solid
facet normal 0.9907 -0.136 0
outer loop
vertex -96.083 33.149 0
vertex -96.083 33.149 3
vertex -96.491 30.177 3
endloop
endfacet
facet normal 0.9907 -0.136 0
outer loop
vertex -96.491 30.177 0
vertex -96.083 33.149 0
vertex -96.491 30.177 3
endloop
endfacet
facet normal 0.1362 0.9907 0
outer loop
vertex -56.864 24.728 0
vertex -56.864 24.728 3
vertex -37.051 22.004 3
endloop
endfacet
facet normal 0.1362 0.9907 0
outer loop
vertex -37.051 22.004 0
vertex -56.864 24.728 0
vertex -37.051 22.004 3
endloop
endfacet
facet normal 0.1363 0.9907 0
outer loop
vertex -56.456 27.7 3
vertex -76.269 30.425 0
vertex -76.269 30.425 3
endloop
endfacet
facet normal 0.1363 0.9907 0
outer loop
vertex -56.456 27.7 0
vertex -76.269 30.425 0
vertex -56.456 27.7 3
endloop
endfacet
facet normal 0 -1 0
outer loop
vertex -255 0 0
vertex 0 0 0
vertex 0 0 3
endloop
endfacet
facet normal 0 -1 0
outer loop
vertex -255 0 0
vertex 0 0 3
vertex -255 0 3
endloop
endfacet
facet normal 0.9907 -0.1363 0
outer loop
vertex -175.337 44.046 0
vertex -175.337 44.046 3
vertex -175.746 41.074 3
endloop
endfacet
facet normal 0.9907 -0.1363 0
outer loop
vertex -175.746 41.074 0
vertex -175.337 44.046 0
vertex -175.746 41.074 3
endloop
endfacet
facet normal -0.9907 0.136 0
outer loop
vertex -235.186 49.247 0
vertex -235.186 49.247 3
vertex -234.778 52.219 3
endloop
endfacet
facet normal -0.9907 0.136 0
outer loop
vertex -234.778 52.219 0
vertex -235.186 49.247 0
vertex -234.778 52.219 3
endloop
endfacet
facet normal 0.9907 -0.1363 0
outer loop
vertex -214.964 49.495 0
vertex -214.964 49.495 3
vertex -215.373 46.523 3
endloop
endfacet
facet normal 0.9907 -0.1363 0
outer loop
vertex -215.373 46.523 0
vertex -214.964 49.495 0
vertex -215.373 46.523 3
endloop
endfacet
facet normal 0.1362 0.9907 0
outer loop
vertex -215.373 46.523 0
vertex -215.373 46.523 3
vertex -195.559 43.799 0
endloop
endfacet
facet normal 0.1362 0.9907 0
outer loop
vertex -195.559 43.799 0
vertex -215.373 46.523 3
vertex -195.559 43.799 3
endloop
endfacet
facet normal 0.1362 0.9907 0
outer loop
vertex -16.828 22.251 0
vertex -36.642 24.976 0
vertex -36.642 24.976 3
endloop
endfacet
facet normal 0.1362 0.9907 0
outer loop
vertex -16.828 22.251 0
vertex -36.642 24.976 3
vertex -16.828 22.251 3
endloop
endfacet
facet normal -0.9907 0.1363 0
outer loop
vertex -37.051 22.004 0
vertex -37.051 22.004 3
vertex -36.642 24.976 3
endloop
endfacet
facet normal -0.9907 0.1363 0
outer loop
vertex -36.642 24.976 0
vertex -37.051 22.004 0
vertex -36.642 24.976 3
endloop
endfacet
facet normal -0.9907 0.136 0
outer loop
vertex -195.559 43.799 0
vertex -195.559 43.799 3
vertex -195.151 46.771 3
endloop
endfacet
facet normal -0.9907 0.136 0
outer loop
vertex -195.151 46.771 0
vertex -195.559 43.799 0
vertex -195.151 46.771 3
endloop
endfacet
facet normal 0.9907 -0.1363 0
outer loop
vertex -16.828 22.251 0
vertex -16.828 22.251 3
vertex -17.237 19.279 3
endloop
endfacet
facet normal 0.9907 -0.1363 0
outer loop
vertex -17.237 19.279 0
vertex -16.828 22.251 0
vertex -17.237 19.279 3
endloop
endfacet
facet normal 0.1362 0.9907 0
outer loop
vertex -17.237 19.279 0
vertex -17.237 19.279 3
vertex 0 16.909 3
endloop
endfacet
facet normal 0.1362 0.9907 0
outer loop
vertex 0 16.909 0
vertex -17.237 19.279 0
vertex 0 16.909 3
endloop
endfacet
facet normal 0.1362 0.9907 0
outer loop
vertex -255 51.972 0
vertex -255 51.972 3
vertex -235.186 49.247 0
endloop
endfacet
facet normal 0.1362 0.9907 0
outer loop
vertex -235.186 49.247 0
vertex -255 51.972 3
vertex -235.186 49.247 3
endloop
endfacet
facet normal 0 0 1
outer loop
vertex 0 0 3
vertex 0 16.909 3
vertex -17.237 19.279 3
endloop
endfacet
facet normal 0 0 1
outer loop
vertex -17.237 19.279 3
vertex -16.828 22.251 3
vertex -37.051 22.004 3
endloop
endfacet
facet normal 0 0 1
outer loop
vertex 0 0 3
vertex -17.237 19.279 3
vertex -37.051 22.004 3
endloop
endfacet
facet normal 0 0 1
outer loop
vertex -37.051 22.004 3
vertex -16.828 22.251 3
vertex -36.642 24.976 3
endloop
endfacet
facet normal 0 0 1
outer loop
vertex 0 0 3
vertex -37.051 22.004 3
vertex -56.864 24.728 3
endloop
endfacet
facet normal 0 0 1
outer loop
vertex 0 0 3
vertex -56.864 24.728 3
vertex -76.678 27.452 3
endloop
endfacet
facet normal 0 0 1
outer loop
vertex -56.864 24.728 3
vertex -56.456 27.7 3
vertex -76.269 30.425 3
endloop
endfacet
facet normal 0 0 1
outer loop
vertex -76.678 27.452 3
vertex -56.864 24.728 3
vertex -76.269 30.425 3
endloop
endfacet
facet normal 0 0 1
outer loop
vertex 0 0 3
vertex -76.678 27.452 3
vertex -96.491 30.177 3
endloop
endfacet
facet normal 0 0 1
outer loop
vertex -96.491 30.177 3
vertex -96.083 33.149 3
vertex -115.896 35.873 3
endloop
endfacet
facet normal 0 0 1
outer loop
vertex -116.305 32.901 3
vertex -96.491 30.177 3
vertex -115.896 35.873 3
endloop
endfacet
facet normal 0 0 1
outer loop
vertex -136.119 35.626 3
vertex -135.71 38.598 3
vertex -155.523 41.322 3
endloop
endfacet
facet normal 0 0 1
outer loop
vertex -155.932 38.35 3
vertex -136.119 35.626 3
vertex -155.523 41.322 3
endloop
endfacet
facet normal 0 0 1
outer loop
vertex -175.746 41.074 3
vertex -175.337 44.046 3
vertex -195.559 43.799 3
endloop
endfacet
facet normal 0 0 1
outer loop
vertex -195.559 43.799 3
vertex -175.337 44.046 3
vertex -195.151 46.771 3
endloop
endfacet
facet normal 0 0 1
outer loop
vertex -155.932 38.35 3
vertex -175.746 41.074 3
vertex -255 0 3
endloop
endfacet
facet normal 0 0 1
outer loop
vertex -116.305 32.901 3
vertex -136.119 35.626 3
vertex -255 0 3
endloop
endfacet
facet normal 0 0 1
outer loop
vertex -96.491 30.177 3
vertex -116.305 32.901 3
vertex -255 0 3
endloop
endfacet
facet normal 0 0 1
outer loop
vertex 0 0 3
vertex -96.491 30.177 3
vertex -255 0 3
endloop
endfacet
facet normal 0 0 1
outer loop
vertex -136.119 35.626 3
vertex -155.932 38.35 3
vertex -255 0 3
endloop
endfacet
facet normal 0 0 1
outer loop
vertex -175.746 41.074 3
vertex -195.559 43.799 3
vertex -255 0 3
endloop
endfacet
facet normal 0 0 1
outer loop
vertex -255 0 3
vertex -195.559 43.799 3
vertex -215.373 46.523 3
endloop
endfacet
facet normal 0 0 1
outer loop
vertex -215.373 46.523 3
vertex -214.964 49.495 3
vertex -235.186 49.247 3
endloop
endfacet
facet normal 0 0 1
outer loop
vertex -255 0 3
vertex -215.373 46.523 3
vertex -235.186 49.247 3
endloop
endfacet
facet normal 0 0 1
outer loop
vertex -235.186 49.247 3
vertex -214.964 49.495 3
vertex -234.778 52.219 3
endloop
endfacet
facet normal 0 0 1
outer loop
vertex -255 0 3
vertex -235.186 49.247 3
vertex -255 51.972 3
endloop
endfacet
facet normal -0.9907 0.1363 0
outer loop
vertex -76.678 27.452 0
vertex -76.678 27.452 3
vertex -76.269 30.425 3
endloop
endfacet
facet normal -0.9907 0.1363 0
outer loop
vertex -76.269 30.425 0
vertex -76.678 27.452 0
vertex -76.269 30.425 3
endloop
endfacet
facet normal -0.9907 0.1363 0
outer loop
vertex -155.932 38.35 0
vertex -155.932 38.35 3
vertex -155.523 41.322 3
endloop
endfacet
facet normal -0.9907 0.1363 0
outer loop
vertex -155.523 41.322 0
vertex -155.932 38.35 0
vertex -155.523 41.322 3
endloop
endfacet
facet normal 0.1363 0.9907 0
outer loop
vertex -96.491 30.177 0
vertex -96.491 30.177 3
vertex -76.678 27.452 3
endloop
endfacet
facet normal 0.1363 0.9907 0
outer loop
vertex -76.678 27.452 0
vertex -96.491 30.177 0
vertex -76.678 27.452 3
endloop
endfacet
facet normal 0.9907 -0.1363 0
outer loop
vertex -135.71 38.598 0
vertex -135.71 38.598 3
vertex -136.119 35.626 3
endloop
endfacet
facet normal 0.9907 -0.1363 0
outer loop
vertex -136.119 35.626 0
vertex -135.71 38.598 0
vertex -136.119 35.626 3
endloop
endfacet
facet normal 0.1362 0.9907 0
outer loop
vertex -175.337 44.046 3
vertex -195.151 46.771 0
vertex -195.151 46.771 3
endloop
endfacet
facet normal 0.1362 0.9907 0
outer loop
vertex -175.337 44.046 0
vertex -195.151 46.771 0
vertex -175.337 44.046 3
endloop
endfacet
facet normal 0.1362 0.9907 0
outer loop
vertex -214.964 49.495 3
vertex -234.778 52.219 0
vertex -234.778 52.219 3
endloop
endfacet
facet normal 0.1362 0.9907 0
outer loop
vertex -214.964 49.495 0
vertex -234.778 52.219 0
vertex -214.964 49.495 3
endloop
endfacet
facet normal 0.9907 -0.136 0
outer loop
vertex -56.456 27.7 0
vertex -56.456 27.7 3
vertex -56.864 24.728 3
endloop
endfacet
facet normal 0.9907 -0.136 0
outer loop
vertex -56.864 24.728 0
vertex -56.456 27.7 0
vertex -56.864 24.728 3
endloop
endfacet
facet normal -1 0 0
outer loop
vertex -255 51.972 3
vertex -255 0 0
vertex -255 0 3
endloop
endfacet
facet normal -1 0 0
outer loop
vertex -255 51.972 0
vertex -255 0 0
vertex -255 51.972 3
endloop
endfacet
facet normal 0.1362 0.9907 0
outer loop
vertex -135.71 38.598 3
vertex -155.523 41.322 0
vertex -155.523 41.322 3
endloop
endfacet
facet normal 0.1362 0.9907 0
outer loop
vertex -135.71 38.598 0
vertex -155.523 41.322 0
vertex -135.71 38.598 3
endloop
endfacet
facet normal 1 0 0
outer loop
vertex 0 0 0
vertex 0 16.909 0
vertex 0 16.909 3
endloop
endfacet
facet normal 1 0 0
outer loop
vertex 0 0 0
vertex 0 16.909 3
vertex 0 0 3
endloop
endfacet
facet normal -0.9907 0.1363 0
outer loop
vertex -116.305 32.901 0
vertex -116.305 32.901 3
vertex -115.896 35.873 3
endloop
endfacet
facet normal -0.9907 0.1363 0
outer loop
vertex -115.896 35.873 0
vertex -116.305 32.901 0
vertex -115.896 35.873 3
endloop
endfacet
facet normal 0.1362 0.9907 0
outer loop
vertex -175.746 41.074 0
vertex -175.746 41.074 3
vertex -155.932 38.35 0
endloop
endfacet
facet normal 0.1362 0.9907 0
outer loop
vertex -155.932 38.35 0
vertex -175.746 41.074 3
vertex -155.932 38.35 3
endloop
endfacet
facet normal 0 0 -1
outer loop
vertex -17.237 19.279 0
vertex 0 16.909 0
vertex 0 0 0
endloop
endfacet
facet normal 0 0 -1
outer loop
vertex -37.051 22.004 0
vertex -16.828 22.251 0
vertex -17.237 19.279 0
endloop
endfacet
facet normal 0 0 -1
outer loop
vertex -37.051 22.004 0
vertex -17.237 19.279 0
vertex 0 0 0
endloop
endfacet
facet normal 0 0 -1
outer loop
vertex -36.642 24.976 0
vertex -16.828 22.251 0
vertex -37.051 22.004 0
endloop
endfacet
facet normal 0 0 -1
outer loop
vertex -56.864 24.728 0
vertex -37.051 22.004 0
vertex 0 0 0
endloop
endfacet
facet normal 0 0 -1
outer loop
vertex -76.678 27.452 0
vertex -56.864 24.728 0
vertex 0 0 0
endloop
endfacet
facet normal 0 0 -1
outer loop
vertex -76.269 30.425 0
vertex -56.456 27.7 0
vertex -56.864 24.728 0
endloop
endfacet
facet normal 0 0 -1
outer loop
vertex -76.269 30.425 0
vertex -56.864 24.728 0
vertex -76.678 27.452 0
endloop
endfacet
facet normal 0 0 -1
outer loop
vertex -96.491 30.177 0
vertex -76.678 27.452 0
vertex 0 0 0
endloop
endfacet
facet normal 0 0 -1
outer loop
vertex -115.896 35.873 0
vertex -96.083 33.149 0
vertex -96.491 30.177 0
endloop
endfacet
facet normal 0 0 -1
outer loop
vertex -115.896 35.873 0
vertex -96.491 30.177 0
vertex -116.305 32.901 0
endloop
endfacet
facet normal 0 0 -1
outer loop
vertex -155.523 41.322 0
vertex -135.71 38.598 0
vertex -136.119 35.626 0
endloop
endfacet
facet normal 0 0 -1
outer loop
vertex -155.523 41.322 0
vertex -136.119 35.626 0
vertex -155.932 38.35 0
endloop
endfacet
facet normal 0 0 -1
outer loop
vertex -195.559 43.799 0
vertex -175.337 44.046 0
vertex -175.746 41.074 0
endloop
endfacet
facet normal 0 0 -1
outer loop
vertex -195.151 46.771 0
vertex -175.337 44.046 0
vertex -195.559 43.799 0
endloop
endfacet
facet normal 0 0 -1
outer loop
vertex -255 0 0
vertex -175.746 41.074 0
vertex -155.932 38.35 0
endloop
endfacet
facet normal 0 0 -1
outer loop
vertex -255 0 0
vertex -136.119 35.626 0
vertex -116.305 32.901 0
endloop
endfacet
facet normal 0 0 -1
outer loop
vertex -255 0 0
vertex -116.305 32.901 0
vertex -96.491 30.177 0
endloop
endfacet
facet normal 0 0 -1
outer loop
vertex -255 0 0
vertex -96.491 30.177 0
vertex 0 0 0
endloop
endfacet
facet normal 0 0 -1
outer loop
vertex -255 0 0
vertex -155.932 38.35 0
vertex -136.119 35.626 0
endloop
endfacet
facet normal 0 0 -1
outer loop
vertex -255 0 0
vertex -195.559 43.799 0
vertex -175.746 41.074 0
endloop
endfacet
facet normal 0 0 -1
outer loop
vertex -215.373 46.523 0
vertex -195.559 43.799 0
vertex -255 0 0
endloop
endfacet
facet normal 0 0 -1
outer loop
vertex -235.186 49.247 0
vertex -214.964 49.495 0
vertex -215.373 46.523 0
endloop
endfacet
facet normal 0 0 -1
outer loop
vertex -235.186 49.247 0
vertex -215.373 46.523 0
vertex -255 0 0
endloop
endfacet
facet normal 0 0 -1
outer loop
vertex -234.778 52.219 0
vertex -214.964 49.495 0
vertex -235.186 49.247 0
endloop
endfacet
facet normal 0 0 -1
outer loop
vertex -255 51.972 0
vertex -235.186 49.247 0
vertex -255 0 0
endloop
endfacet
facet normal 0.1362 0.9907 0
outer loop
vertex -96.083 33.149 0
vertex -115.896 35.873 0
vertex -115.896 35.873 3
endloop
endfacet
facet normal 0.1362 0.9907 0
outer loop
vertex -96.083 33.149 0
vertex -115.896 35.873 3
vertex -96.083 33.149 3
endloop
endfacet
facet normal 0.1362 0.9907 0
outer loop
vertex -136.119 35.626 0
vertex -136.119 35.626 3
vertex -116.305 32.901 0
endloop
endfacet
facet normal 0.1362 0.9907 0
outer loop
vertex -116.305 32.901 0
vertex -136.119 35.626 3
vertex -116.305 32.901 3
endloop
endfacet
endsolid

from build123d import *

# Parameters (mm, degrees)
BOSS_EXTRU_1_DEPTH      = 3
ENL_V_MAT_EXTRU_1_DEPTH = 4


with BuildPart() as part:
    # Esquisse1 → Boss.-Extru.1 (new body)
    with BuildSketch(Plane.XY):
        Polygon((0, 0), (-255, 0), (-255, 55), (0, 19.9375), align=None)
    extrude(amount=BOSS_EXTRU_1_DEPTH)

    # Esquisse2 → Enlèv. mat.-Extru.1 (cut, through all)
    with BuildSketch(Plane.XY.offset(3)):
        Polygon((-235.186423203, 49.247406605), (-234.777768182, 52.219443125), (-255, 55), (-255, 51.971773415), align=None)
        Polygon((-195.150614588, 46.770709506), (-214.964191385, 49.495076315), (-215.372846406, 46.523039796), (-195.559269609, 43.798672986), align=None)
        Polygon((-155.523460994, 41.321975887), (-175.337037791, 44.046342696), (-175.745692812, 41.074306177), (-155.932116015, 38.349939367), align=None)
        Polygon((-115.8963074, 35.873242268), (-135.709884197, 38.597609077), (-136.118539219, 35.625572558), (-116.304962422, 32.901205748), align=None)
        Polygon((-76.269153806, 30.424508648), (-96.082730603, 33.148875458), (-96.491385625, 30.176838938), (-76.677808828, 27.452472129), align=None)
        Polygon((-36.642000213, 24.975775029), (-56.45557701, 27.700141839), (-56.864232031, 24.728105319), (-37.050655234, 22.00373851), align=None)
        Polygon((0, 19.9375), (-16.828423416, 22.25140822), (-17.237078437, 19.2793717), (0, 16.909273415), align=None)
    extrude(amount=-ENL_V_MAT_EXTRU_1_DEPTH, mode=Mode.SUBTRACT)


solid = part.part
